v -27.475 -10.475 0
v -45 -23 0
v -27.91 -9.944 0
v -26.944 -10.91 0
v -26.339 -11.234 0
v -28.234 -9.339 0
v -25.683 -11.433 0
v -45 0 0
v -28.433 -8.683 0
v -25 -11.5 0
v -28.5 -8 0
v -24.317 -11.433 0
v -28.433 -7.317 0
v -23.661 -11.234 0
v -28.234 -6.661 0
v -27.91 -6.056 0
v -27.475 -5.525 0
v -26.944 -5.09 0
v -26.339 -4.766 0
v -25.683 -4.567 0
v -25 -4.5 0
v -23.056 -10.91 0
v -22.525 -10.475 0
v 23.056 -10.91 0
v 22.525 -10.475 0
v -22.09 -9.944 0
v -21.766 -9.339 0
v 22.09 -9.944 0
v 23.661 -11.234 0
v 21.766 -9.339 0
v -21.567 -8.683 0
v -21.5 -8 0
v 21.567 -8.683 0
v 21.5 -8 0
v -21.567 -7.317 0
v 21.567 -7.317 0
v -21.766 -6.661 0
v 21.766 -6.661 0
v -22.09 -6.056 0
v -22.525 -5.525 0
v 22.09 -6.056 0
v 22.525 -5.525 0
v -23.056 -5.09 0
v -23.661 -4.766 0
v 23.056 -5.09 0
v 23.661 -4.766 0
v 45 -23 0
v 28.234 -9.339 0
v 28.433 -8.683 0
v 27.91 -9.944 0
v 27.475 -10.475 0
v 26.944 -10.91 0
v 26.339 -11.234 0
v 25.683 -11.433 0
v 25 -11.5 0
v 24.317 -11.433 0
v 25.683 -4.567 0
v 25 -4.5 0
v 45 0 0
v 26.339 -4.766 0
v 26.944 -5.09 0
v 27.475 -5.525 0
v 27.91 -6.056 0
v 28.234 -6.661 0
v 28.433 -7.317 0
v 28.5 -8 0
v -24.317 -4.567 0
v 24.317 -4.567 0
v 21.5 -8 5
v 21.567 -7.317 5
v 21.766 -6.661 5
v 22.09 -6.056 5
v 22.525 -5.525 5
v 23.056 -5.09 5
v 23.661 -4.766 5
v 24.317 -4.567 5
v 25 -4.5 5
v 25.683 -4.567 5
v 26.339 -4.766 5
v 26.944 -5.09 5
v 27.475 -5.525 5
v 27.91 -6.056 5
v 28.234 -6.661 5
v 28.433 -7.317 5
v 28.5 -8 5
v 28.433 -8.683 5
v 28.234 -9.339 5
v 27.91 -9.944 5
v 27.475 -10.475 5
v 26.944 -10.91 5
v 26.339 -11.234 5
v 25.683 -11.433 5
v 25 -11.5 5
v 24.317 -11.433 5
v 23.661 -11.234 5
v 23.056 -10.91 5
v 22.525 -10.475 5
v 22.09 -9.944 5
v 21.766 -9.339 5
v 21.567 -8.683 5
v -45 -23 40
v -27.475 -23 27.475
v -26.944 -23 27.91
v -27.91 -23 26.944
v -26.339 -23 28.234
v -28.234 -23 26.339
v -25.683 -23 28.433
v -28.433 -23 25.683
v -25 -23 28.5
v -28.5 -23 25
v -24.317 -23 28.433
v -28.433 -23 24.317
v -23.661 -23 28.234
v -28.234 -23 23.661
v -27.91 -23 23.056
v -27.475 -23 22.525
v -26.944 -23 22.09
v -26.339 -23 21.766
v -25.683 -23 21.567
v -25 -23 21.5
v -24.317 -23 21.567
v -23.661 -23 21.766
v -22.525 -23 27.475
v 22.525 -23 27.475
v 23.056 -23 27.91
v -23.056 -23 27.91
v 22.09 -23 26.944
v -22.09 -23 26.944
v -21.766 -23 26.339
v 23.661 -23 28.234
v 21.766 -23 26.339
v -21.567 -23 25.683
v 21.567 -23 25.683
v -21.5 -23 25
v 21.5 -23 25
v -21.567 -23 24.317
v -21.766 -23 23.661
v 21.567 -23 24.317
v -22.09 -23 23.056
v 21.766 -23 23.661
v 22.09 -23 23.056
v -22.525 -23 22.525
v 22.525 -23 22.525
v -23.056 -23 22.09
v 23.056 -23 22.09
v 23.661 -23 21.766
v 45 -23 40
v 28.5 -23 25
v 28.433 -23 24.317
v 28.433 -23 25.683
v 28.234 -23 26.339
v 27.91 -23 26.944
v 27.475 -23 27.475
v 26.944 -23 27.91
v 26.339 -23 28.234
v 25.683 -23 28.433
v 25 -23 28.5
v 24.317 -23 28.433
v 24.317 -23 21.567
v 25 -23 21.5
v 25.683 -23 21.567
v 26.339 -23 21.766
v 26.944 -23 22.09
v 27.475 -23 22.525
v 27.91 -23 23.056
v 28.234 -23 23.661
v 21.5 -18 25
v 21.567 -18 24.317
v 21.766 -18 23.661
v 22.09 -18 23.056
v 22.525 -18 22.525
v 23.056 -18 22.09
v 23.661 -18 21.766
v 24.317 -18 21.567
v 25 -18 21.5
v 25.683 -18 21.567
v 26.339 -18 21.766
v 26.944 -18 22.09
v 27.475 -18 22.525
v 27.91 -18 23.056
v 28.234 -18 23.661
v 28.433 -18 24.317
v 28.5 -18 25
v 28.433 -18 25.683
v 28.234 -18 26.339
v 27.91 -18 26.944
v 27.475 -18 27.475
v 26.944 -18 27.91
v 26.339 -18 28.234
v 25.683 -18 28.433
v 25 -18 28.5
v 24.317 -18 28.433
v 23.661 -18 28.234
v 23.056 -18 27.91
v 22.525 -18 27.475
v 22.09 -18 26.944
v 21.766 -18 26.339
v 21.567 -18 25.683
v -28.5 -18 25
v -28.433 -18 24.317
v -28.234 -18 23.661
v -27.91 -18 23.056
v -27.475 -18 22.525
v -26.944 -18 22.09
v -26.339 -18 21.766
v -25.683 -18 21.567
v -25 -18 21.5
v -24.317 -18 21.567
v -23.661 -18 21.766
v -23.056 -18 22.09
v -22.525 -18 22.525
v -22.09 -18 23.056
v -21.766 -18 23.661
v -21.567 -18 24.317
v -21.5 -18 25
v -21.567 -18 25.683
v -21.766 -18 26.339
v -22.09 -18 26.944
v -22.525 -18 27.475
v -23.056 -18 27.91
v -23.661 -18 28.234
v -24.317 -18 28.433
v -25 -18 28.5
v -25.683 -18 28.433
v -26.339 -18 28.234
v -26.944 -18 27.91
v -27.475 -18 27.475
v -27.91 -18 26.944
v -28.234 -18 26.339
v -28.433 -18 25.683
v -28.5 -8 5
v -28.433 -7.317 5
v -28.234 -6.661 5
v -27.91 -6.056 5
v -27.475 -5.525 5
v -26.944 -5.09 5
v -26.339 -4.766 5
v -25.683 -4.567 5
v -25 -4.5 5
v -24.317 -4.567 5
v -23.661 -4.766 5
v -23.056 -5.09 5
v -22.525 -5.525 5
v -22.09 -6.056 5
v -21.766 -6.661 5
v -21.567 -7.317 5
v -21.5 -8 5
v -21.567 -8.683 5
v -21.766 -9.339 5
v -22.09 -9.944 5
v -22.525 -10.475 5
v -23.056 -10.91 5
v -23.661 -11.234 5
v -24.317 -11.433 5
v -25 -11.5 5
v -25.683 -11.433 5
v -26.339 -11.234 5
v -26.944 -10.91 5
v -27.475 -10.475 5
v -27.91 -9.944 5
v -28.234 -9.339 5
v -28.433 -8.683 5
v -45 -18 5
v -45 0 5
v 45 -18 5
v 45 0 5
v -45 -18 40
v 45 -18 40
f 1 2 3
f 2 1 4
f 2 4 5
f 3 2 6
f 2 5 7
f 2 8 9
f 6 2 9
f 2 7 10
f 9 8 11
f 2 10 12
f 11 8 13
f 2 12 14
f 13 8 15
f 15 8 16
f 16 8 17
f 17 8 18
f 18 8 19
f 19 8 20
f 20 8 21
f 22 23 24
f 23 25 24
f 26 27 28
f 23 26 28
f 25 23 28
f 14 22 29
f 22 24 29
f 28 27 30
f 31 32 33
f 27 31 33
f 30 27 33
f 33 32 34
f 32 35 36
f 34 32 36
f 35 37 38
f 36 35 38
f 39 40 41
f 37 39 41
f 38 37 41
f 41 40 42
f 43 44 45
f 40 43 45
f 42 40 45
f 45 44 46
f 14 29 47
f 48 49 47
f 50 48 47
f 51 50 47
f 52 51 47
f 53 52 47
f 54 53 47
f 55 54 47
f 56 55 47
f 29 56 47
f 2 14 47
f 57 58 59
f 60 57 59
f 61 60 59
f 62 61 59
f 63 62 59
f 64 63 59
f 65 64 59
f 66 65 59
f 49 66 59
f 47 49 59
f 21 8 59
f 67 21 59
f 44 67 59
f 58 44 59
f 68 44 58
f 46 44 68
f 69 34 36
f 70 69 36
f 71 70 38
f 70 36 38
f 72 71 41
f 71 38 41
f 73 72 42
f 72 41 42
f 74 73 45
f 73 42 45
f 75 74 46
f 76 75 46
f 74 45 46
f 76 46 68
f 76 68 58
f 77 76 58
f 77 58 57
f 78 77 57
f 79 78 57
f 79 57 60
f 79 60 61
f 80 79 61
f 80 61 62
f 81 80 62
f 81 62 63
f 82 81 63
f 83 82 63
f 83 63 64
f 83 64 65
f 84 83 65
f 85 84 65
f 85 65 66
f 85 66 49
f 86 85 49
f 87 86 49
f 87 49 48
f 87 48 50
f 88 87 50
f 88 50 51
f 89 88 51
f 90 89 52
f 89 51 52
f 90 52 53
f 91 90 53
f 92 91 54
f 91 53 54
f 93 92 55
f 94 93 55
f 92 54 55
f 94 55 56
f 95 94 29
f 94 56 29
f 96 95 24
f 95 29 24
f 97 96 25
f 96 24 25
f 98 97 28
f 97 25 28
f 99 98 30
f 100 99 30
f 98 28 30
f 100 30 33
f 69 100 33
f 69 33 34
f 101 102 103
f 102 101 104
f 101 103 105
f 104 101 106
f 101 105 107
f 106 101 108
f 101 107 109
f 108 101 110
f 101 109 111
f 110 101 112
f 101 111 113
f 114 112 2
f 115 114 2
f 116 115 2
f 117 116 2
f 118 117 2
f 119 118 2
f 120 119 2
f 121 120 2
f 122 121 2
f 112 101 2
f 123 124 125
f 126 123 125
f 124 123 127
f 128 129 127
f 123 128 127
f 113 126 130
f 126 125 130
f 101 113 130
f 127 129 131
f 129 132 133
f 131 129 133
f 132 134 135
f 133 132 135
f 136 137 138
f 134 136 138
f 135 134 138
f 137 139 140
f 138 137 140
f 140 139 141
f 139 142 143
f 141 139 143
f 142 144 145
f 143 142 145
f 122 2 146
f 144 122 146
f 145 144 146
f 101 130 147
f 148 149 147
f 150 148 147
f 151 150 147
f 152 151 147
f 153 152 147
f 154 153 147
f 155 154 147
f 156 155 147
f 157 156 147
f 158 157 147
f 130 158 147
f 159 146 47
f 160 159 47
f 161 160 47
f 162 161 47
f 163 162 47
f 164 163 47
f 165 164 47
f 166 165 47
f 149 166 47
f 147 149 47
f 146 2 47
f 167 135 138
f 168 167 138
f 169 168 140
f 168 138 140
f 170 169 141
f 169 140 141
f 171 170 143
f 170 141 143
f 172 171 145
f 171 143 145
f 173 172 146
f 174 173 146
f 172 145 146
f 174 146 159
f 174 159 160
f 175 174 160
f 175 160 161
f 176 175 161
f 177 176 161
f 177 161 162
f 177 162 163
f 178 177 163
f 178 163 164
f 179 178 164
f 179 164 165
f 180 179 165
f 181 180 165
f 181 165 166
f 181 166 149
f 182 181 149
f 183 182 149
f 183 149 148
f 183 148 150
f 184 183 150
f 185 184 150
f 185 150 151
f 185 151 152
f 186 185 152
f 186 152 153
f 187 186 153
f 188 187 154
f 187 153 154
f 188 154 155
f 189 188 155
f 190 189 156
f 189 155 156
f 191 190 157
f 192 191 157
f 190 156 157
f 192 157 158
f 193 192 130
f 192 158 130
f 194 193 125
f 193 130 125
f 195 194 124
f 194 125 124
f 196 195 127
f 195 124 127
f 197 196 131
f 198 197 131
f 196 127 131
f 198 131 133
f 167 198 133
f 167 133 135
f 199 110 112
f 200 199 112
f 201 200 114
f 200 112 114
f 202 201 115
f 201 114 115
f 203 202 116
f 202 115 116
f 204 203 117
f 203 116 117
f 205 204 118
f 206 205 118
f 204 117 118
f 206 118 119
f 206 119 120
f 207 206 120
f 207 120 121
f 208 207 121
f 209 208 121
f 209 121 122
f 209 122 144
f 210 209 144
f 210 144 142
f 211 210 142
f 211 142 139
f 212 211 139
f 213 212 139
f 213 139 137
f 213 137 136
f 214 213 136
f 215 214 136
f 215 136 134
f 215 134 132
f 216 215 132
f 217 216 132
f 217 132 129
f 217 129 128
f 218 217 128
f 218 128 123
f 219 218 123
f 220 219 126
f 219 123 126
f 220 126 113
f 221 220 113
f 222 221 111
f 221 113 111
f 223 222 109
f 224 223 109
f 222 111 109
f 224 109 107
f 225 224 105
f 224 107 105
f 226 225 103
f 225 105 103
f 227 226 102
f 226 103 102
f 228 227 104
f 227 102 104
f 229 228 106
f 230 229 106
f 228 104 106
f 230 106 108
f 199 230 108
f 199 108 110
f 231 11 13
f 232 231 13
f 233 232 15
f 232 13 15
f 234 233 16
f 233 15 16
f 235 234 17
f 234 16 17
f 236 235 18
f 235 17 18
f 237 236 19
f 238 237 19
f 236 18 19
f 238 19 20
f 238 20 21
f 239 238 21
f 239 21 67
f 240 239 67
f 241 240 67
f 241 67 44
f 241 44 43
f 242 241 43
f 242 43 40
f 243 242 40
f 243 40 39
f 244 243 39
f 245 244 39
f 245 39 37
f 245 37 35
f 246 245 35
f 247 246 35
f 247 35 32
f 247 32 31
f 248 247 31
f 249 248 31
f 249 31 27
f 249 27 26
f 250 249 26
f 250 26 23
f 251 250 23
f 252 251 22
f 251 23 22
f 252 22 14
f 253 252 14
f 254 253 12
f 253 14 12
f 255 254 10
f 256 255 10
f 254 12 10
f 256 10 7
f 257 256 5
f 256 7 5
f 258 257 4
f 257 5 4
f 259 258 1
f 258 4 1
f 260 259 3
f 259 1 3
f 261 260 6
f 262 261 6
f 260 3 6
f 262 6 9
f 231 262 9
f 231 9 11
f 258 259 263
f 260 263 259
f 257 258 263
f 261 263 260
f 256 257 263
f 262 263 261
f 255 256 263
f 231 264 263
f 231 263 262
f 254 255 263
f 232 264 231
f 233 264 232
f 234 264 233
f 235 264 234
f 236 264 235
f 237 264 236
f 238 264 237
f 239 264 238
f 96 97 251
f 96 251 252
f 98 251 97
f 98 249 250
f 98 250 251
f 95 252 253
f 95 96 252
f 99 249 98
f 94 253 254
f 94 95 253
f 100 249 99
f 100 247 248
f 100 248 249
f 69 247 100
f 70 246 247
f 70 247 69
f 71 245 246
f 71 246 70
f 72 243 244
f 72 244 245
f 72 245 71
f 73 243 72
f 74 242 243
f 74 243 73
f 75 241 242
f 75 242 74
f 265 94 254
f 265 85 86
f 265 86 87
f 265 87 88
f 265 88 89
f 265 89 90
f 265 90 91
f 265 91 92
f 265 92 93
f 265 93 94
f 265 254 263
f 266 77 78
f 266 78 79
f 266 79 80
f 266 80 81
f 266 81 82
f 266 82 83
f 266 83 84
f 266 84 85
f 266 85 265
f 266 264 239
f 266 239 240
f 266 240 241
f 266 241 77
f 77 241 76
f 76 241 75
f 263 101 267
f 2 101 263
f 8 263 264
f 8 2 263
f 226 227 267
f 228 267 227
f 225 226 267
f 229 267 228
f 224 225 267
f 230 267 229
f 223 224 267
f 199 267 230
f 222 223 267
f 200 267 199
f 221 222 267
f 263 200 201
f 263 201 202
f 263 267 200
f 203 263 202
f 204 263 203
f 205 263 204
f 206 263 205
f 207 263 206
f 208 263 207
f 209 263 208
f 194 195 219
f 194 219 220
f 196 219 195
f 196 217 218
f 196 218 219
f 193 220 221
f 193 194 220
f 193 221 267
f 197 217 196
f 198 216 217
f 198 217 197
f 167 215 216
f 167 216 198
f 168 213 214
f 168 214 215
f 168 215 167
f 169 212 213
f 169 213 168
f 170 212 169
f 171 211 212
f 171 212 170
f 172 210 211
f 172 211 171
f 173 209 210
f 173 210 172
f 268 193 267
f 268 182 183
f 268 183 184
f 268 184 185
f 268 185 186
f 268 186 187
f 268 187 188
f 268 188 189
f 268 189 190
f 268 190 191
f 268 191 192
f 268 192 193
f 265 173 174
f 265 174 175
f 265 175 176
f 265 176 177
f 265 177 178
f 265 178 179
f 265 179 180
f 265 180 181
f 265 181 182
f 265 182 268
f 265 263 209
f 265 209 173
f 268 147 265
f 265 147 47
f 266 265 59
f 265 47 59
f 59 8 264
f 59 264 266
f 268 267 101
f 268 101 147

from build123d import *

# Parameters (mm, degrees)
SKETCH2_W             = 90
SKETCH2_H             = 23
BOSS_EXTRUDE2_DEPTH   = 5
SKETCH4_W             = 90
SKETCH4_H             = 5
BOSS_EXTRUDE3_DEPTH   = 35
M8X1_0_TAPPED_HOLE1_D = 7
M8X1_0_TAPPED_HOLE2_D = 7


with BuildPart() as part:
    # Sketch2 → Boss-Extrude2 (new body)
    with BuildSketch(Plane.XY):
        with Locations((0, -11.5)):
            Rectangle(SKETCH2_W, SKETCH2_H)
    extrude(amount=BOSS_EXTRUDE2_DEPTH)

    # Sketch4 → Boss-Extrude3 (add)
    with BuildSketch(Plane.XY.offset(5)):
        with Locations((0, -20.5)):
            Rectangle(SKETCH4_W, SKETCH4_H)
    extrude(amount=BOSS_EXTRUDE3_DEPTH)

    # M8x1.0 Tapped Hole1 (through all)
    with Locations(Plane.XY.offset(5)):
        with Locations((-25, -8), (25, -8)):
            Hole(M8X1_0_TAPPED_HOLE1_D / 2)

    # M8x1.0 Tapped Hole2 (through all)
    with Locations(Plane(origin=(0, -18, 0), x_dir=(1, 0, 0), z_dir=(0, 1, 0))):
        with Locations((-25, -25), (25, -25)):
            Hole(M8X1_0_TAPPED_HOLE2_D / 2)


solid = part.part
